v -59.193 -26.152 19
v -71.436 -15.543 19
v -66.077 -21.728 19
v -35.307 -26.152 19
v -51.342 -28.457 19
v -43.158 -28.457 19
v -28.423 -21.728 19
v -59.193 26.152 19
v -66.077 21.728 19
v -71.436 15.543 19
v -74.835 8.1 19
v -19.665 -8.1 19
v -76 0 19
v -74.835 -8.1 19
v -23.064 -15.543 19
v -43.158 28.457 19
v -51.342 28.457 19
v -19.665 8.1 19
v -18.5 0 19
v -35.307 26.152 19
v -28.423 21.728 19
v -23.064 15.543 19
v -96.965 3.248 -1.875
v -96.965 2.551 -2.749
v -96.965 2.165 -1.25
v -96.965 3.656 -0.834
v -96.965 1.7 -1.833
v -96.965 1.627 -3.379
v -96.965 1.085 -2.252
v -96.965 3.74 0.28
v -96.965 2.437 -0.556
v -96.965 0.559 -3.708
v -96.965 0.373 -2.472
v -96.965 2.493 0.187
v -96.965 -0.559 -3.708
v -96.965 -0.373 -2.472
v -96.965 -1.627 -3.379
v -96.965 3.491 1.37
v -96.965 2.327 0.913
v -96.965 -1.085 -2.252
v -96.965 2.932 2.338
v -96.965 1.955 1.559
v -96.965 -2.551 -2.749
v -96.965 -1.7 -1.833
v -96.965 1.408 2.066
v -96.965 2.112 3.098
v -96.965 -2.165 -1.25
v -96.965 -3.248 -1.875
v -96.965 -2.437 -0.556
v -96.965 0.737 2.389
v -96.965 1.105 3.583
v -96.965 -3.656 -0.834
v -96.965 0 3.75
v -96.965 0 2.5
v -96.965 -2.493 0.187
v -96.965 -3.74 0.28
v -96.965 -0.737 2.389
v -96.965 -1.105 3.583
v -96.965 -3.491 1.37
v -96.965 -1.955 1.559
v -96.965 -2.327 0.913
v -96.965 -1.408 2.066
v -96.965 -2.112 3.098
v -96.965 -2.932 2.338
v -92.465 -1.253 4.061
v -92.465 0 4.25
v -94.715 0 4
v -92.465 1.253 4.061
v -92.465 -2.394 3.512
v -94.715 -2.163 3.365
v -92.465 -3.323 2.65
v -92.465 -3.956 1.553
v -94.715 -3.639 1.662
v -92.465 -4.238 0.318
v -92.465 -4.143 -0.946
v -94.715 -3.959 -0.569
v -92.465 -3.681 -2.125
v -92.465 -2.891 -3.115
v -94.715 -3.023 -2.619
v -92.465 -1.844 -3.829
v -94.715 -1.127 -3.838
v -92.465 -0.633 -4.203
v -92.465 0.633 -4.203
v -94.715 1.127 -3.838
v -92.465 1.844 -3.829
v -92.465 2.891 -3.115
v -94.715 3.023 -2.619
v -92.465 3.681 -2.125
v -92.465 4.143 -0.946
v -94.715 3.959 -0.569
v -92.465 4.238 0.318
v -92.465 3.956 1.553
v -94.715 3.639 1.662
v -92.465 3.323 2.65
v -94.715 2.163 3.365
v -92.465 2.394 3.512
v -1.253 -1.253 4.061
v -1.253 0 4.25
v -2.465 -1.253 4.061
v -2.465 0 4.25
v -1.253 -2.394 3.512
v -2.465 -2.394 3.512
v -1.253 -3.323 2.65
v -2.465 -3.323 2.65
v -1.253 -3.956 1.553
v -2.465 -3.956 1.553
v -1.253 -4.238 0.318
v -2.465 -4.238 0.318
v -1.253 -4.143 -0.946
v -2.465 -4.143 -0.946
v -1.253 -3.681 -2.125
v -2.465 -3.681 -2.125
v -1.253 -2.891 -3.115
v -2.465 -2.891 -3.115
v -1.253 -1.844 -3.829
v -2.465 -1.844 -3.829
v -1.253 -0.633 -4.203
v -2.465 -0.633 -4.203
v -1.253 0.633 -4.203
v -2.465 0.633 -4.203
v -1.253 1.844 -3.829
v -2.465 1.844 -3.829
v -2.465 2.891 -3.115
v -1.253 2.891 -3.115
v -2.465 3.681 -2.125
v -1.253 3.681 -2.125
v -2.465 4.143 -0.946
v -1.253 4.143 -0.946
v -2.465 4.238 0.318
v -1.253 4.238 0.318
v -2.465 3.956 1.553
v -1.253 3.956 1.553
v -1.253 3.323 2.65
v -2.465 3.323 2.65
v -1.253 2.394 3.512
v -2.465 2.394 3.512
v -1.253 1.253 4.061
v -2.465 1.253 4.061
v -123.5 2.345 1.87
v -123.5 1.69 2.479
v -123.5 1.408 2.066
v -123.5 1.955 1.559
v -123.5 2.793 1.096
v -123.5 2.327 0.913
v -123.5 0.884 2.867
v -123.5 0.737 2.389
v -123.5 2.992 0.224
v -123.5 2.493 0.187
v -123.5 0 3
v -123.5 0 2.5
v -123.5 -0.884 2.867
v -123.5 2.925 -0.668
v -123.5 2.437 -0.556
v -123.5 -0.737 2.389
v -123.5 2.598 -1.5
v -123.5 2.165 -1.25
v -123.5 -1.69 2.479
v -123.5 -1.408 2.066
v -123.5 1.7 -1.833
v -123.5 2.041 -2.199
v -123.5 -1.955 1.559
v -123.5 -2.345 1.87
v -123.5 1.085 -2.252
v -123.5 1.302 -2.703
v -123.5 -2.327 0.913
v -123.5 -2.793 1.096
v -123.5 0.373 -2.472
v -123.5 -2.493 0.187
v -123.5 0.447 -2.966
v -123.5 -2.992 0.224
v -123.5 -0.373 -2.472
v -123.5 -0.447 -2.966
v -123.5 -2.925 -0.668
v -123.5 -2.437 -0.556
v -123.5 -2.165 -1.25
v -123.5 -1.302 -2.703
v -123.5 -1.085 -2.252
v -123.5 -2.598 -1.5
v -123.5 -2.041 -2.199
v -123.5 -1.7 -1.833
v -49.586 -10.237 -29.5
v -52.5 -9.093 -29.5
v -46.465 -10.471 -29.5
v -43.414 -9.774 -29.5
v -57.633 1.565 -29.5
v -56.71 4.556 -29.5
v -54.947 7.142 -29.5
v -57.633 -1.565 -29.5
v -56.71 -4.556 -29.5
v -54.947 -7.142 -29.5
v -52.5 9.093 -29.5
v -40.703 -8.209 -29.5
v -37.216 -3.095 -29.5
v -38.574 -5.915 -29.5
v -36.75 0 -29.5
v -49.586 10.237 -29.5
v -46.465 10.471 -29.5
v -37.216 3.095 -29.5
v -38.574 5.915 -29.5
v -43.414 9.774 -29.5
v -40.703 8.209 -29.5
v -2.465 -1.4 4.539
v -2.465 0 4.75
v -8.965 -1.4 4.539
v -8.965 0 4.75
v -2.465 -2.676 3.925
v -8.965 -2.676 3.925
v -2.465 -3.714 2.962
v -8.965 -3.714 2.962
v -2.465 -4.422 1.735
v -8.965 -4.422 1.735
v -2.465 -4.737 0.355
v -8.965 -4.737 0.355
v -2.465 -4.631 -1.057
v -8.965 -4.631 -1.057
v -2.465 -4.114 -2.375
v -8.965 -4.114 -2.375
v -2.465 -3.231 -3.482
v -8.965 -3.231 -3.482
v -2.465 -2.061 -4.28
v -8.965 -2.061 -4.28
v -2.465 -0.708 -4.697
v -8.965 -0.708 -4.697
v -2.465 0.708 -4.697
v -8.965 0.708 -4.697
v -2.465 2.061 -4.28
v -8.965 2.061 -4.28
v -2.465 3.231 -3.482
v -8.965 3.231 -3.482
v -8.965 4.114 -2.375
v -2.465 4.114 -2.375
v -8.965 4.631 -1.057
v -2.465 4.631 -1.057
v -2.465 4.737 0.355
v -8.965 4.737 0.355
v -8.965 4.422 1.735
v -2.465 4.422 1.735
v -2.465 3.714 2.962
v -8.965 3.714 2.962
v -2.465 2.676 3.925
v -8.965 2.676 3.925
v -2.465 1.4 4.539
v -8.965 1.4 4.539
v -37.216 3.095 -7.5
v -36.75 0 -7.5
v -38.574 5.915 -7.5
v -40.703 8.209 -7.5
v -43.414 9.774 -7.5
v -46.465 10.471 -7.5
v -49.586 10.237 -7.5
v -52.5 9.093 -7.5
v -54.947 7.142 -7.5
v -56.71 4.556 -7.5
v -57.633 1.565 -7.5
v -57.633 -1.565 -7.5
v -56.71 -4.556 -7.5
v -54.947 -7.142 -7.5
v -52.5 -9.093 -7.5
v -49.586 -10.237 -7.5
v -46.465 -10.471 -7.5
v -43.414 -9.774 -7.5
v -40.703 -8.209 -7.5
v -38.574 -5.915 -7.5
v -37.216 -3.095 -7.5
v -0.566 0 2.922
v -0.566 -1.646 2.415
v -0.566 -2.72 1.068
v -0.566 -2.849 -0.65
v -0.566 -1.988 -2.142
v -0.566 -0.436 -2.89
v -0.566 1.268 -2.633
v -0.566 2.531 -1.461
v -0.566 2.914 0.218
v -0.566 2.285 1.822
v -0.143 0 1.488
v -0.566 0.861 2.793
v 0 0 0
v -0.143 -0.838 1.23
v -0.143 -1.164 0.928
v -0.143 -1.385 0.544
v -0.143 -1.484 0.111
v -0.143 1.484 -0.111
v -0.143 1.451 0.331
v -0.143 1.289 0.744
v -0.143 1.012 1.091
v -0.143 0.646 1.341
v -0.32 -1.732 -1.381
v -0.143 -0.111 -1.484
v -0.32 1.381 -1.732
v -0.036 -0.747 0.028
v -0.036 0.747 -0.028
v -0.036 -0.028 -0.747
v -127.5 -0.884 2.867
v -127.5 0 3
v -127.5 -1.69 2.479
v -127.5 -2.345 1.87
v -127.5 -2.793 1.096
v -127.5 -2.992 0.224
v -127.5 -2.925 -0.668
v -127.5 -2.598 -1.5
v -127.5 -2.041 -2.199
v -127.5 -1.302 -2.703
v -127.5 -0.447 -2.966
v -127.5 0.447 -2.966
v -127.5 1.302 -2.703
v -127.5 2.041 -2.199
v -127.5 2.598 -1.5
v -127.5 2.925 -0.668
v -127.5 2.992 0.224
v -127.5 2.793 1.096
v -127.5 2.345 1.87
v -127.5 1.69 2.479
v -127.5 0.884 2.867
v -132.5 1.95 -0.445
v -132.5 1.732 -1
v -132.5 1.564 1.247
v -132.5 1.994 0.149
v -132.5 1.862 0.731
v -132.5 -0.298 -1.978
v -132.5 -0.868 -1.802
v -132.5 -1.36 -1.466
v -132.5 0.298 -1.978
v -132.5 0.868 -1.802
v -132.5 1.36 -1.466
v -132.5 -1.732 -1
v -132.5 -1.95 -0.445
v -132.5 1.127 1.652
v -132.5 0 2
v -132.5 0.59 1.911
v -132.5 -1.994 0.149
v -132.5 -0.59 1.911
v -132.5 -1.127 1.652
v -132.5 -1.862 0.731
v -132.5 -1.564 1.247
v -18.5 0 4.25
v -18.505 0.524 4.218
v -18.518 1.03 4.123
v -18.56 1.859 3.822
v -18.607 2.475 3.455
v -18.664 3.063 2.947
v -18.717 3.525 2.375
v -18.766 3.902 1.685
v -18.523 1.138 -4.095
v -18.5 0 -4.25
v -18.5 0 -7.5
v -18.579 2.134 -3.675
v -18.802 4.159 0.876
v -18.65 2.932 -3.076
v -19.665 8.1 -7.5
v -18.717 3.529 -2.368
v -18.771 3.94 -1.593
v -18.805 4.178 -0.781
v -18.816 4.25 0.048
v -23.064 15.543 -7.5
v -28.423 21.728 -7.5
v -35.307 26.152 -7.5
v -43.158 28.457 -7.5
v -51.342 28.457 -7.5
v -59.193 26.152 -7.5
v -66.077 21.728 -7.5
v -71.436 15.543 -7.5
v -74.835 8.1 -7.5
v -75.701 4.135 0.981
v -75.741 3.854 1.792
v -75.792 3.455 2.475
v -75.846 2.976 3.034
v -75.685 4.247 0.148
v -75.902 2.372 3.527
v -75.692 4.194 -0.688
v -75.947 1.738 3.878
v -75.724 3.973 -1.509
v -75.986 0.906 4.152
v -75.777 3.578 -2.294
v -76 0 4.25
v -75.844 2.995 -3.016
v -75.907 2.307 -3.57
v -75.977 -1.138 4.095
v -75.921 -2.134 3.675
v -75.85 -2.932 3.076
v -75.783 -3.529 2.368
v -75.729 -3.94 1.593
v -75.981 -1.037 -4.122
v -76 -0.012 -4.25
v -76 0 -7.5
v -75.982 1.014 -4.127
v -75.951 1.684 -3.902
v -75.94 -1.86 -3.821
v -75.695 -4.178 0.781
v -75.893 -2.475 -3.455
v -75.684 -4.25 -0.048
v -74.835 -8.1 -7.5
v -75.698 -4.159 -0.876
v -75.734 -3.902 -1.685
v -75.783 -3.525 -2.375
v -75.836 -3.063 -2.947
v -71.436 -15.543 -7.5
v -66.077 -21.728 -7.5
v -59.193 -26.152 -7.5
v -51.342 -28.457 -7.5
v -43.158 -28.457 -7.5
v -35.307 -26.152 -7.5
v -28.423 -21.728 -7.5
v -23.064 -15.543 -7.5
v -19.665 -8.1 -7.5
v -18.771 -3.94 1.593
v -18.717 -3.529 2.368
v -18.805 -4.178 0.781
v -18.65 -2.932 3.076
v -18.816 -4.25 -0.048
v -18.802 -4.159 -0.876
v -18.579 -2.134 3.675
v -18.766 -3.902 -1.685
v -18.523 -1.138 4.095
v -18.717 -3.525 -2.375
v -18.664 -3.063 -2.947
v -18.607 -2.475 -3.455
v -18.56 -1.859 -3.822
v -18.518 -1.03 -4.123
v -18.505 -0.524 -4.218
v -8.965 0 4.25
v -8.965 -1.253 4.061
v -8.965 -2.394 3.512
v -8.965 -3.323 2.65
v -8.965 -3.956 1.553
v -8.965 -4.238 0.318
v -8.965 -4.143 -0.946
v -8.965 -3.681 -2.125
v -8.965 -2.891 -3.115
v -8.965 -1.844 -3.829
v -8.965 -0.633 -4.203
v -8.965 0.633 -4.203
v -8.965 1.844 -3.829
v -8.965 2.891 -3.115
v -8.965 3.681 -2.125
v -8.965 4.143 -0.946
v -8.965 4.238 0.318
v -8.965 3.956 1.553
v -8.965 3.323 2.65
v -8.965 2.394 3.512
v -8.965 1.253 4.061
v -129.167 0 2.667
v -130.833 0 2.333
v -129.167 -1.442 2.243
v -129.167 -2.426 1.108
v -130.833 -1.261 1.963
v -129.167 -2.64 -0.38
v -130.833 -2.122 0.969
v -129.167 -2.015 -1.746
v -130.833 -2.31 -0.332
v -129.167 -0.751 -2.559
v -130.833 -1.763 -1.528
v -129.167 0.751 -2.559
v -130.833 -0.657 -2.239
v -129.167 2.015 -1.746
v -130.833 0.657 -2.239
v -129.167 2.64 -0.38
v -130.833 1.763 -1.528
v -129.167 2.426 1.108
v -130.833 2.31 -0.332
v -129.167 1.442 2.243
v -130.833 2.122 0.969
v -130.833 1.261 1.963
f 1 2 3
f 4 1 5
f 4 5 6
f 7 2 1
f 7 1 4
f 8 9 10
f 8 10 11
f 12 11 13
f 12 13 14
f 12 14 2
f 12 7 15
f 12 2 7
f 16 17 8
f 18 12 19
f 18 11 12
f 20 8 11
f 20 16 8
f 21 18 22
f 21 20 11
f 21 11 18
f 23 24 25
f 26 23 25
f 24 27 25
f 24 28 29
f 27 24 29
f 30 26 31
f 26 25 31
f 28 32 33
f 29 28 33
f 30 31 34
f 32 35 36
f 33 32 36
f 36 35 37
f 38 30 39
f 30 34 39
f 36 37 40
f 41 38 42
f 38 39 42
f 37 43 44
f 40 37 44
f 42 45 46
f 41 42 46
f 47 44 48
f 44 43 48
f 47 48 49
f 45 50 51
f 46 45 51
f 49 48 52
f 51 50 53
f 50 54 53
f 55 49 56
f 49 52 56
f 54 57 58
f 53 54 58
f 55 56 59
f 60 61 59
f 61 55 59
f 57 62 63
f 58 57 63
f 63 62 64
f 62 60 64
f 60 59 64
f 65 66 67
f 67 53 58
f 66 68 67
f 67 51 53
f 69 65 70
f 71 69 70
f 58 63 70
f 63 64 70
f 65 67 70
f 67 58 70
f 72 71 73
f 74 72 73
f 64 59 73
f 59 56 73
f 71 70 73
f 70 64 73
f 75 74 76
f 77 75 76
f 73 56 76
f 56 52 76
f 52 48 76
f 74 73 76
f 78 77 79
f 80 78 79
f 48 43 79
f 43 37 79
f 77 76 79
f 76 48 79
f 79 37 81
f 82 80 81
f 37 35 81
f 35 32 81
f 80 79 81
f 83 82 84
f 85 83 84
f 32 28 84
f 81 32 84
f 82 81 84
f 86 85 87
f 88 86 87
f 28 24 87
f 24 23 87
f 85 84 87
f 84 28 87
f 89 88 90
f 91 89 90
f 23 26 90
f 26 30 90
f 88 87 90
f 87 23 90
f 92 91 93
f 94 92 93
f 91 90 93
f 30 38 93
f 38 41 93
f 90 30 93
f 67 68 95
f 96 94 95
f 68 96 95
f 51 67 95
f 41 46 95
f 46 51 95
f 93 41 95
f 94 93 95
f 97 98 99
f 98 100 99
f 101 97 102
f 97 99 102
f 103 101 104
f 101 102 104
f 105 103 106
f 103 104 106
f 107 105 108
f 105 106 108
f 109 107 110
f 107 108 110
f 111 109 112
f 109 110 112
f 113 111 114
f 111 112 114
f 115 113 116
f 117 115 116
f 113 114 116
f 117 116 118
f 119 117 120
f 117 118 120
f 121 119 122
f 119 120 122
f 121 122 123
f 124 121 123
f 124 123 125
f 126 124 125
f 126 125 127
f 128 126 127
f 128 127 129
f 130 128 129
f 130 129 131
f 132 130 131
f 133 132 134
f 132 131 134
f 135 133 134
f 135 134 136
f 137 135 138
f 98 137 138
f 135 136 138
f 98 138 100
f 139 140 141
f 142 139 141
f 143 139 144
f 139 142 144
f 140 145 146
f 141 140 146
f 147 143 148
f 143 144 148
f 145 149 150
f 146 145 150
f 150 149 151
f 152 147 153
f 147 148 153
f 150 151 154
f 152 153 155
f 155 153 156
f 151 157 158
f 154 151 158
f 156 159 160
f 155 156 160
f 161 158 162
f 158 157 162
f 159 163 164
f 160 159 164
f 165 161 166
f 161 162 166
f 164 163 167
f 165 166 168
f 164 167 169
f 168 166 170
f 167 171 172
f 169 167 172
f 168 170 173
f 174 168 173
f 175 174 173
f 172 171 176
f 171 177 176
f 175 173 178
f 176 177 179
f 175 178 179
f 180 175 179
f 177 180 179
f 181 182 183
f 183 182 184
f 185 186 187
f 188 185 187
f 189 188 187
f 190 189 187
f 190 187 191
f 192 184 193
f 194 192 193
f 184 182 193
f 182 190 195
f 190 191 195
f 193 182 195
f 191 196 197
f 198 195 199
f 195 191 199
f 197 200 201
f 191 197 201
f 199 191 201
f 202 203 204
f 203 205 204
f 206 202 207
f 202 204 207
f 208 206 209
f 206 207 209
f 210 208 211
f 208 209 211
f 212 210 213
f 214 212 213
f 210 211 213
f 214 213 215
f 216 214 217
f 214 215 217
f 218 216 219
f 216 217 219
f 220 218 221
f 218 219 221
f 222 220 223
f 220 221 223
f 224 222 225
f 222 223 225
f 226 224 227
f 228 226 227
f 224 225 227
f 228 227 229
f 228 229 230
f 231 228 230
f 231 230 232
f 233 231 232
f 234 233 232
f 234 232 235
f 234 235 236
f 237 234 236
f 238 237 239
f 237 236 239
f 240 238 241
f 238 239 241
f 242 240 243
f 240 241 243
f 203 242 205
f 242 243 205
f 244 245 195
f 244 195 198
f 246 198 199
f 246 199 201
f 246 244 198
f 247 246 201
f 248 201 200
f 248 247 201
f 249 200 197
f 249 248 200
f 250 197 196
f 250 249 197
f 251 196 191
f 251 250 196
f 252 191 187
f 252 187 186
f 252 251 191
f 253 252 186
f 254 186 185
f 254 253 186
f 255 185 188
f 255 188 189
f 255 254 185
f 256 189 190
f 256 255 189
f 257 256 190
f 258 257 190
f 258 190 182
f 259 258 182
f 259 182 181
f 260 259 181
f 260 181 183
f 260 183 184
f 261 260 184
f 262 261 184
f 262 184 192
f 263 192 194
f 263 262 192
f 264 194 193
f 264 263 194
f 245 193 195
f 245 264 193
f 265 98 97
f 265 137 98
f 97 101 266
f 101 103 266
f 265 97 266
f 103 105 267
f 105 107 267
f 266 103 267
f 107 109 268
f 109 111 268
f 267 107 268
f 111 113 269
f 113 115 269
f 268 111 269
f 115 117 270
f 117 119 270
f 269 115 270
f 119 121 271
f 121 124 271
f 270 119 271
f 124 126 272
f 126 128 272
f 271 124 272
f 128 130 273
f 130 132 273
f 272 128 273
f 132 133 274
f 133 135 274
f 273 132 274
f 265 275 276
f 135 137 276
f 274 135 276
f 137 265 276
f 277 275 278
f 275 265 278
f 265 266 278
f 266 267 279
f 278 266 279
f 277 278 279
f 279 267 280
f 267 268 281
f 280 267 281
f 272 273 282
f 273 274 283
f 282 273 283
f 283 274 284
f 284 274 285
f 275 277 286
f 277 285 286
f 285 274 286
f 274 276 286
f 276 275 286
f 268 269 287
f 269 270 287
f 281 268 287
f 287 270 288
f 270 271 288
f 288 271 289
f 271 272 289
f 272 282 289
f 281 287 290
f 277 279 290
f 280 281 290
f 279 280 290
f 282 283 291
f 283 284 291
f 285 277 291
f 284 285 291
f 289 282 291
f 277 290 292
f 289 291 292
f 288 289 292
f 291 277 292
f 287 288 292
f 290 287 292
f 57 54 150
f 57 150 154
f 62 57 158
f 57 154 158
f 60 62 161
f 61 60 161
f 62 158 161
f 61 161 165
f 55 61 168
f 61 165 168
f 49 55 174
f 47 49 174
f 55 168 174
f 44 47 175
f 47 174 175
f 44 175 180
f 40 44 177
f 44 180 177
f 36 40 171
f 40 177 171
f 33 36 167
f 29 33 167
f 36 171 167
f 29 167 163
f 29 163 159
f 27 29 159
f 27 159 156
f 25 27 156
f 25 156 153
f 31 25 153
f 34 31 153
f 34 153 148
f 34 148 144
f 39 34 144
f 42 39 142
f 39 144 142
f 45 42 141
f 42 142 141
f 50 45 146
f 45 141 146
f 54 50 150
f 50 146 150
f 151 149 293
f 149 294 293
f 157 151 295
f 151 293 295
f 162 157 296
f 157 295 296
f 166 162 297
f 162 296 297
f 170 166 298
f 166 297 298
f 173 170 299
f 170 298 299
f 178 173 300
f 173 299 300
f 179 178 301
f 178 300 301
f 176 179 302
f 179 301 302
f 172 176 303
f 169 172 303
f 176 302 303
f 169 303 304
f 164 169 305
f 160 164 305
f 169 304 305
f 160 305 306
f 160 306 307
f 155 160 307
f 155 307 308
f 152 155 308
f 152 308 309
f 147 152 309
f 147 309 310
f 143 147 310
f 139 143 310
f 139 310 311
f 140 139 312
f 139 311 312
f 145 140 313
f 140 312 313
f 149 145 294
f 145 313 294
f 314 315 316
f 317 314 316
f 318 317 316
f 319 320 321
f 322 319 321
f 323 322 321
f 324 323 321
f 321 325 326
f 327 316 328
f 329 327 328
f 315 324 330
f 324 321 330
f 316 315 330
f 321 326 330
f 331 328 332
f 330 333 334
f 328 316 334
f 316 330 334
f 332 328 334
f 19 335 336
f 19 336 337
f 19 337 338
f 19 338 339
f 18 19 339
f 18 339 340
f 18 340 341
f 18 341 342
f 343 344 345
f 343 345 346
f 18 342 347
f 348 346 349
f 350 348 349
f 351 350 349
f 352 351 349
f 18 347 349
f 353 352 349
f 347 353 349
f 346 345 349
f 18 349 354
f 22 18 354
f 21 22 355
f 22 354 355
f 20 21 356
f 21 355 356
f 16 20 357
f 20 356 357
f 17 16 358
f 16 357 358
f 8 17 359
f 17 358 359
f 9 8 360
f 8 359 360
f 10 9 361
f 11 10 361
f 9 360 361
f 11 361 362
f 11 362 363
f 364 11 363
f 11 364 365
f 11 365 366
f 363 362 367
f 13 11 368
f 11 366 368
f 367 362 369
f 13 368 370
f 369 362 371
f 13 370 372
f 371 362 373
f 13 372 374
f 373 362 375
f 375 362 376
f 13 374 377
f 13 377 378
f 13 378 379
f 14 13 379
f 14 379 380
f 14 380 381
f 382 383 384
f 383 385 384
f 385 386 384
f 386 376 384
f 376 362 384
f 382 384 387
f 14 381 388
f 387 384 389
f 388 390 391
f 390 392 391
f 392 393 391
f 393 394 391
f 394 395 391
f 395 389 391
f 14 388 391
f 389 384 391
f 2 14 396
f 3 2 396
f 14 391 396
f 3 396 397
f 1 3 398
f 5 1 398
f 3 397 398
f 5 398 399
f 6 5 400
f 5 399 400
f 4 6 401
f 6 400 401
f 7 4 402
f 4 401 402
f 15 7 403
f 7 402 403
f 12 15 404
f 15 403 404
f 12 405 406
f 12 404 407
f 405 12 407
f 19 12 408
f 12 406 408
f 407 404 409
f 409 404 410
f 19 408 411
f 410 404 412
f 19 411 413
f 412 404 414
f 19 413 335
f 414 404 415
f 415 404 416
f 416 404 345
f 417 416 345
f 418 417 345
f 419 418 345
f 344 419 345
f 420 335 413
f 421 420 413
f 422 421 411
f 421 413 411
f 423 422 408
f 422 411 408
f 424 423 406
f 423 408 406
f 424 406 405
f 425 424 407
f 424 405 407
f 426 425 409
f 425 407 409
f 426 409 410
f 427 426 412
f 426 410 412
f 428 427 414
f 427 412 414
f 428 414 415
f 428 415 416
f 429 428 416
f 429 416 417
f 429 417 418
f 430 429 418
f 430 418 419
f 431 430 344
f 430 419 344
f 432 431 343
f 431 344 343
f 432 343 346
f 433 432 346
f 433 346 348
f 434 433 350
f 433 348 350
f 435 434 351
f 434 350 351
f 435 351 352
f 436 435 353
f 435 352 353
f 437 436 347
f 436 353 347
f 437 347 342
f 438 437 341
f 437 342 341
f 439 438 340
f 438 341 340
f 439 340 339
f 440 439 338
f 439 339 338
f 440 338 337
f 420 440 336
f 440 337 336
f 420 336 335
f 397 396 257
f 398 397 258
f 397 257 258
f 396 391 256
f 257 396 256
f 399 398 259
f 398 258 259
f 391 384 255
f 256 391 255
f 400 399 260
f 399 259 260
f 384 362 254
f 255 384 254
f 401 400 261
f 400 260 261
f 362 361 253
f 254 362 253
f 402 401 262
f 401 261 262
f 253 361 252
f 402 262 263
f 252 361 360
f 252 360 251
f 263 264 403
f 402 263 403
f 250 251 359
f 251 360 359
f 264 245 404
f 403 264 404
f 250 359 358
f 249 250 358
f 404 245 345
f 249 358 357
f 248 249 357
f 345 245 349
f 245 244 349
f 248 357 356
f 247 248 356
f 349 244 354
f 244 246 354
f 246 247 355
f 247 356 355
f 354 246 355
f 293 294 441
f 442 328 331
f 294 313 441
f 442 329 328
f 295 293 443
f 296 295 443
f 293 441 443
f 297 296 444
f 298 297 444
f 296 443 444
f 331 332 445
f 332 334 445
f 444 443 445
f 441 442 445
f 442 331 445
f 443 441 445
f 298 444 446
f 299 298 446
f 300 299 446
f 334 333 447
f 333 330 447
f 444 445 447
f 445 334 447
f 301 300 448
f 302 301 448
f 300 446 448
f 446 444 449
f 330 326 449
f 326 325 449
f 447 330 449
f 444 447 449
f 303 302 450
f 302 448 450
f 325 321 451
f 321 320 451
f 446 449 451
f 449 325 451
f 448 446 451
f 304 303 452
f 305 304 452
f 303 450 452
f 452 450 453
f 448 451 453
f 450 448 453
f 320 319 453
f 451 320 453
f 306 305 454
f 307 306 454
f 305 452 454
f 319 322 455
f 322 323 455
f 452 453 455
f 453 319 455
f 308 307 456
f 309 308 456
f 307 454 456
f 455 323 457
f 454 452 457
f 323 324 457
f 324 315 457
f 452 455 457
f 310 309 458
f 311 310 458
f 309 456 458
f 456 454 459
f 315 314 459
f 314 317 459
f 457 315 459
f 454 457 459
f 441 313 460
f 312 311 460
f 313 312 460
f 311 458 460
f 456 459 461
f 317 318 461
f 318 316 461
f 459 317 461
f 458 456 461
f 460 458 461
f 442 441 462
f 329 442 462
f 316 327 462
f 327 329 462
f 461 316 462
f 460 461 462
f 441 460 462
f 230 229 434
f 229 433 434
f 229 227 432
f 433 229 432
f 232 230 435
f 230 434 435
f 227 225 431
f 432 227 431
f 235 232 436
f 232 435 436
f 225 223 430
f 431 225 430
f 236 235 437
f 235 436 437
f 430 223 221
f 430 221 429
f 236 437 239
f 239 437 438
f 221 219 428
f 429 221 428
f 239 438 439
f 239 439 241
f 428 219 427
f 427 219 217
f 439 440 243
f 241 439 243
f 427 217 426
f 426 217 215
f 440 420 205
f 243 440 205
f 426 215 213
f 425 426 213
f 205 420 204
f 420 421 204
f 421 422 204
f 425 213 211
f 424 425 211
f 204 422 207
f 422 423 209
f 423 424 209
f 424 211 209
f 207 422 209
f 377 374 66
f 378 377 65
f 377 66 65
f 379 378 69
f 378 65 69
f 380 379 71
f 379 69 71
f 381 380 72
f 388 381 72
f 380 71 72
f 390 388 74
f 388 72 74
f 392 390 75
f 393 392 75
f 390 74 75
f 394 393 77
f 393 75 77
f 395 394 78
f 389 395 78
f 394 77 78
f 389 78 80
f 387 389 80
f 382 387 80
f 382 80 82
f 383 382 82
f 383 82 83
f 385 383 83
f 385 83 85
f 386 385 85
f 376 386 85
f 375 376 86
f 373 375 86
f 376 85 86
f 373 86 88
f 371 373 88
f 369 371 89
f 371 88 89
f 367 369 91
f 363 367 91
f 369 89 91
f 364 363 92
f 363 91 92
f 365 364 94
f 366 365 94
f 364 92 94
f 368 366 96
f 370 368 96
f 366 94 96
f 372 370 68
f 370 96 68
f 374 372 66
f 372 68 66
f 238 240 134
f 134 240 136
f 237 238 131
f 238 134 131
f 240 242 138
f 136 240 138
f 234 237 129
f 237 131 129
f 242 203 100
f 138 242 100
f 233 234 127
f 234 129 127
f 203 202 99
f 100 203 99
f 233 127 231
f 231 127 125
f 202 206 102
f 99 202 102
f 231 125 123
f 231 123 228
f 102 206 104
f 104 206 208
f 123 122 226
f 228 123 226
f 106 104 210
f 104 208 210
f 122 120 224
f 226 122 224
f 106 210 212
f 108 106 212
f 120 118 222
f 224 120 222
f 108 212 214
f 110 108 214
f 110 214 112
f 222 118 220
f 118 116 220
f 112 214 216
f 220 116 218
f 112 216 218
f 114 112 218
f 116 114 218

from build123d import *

# Parameters (mm, degrees)
SKETCH002_R  = 28.75
PAD_DEPTH    = 26.5
SKETCH003_R  = 10.5
PAD001_DEPTH = 22


with BuildPart() as part:
    # Sketch → Revolution (revolve)
    with BuildSketch(Plane.XZ):
        with BuildLine():
            Line((-132.5, 0), (0, 0))
            ThreePointArc((0, 0), (-0.319822, 2.215454), (-1.253174, 4.25))
            Line((-1.253174, 4.25), (-2.465385, 4.25))
            Line((-2.465385, 4.25), (-2.465385, 4.75))
            Line((-2.465385, 4.75), (-8.965385, 4.75))
            Line((-8.965385, 4.75), (-8.965385, 4.25))
            Line((-8.965385, 4.25), (-92.465385, 4.25))
            Line((-92.465385, 4.25), (-96.965385, 3.75))
            Line((-96.965385, 3.75), (-96.965385, 2.5))
            Line((-96.965385, 2.5), (-123.5, 2.5))
            Line((-123.5, 2.5), (-123.5, 3))
            Line((-123.5, 3), (-127.5, 3))
            Line((-127.5, 3), (-132.5, 2))
            Line((-132.5, 2), (-132.5, 0))
        make_face()
    revolve(axis=Axis((0, 0, 0), (1, 0, 0)))

    # Sketch002 → Pad (new body)
    with BuildSketch(Plane.XY.offset(-7.5)):
        with Locations((-47.25, 0)):
            Circle(SKETCH002_R)
    extrude(amount=PAD_DEPTH)

    # Sketch003 → Pad001 (join)
    with BuildSketch(Plane.XY.offset(-7.5)):
        with Locations((-47.25, 0)):
            Circle(SKETCH003_R)
    extrude(amount=-PAD001_DEPTH)


solid = part.part
